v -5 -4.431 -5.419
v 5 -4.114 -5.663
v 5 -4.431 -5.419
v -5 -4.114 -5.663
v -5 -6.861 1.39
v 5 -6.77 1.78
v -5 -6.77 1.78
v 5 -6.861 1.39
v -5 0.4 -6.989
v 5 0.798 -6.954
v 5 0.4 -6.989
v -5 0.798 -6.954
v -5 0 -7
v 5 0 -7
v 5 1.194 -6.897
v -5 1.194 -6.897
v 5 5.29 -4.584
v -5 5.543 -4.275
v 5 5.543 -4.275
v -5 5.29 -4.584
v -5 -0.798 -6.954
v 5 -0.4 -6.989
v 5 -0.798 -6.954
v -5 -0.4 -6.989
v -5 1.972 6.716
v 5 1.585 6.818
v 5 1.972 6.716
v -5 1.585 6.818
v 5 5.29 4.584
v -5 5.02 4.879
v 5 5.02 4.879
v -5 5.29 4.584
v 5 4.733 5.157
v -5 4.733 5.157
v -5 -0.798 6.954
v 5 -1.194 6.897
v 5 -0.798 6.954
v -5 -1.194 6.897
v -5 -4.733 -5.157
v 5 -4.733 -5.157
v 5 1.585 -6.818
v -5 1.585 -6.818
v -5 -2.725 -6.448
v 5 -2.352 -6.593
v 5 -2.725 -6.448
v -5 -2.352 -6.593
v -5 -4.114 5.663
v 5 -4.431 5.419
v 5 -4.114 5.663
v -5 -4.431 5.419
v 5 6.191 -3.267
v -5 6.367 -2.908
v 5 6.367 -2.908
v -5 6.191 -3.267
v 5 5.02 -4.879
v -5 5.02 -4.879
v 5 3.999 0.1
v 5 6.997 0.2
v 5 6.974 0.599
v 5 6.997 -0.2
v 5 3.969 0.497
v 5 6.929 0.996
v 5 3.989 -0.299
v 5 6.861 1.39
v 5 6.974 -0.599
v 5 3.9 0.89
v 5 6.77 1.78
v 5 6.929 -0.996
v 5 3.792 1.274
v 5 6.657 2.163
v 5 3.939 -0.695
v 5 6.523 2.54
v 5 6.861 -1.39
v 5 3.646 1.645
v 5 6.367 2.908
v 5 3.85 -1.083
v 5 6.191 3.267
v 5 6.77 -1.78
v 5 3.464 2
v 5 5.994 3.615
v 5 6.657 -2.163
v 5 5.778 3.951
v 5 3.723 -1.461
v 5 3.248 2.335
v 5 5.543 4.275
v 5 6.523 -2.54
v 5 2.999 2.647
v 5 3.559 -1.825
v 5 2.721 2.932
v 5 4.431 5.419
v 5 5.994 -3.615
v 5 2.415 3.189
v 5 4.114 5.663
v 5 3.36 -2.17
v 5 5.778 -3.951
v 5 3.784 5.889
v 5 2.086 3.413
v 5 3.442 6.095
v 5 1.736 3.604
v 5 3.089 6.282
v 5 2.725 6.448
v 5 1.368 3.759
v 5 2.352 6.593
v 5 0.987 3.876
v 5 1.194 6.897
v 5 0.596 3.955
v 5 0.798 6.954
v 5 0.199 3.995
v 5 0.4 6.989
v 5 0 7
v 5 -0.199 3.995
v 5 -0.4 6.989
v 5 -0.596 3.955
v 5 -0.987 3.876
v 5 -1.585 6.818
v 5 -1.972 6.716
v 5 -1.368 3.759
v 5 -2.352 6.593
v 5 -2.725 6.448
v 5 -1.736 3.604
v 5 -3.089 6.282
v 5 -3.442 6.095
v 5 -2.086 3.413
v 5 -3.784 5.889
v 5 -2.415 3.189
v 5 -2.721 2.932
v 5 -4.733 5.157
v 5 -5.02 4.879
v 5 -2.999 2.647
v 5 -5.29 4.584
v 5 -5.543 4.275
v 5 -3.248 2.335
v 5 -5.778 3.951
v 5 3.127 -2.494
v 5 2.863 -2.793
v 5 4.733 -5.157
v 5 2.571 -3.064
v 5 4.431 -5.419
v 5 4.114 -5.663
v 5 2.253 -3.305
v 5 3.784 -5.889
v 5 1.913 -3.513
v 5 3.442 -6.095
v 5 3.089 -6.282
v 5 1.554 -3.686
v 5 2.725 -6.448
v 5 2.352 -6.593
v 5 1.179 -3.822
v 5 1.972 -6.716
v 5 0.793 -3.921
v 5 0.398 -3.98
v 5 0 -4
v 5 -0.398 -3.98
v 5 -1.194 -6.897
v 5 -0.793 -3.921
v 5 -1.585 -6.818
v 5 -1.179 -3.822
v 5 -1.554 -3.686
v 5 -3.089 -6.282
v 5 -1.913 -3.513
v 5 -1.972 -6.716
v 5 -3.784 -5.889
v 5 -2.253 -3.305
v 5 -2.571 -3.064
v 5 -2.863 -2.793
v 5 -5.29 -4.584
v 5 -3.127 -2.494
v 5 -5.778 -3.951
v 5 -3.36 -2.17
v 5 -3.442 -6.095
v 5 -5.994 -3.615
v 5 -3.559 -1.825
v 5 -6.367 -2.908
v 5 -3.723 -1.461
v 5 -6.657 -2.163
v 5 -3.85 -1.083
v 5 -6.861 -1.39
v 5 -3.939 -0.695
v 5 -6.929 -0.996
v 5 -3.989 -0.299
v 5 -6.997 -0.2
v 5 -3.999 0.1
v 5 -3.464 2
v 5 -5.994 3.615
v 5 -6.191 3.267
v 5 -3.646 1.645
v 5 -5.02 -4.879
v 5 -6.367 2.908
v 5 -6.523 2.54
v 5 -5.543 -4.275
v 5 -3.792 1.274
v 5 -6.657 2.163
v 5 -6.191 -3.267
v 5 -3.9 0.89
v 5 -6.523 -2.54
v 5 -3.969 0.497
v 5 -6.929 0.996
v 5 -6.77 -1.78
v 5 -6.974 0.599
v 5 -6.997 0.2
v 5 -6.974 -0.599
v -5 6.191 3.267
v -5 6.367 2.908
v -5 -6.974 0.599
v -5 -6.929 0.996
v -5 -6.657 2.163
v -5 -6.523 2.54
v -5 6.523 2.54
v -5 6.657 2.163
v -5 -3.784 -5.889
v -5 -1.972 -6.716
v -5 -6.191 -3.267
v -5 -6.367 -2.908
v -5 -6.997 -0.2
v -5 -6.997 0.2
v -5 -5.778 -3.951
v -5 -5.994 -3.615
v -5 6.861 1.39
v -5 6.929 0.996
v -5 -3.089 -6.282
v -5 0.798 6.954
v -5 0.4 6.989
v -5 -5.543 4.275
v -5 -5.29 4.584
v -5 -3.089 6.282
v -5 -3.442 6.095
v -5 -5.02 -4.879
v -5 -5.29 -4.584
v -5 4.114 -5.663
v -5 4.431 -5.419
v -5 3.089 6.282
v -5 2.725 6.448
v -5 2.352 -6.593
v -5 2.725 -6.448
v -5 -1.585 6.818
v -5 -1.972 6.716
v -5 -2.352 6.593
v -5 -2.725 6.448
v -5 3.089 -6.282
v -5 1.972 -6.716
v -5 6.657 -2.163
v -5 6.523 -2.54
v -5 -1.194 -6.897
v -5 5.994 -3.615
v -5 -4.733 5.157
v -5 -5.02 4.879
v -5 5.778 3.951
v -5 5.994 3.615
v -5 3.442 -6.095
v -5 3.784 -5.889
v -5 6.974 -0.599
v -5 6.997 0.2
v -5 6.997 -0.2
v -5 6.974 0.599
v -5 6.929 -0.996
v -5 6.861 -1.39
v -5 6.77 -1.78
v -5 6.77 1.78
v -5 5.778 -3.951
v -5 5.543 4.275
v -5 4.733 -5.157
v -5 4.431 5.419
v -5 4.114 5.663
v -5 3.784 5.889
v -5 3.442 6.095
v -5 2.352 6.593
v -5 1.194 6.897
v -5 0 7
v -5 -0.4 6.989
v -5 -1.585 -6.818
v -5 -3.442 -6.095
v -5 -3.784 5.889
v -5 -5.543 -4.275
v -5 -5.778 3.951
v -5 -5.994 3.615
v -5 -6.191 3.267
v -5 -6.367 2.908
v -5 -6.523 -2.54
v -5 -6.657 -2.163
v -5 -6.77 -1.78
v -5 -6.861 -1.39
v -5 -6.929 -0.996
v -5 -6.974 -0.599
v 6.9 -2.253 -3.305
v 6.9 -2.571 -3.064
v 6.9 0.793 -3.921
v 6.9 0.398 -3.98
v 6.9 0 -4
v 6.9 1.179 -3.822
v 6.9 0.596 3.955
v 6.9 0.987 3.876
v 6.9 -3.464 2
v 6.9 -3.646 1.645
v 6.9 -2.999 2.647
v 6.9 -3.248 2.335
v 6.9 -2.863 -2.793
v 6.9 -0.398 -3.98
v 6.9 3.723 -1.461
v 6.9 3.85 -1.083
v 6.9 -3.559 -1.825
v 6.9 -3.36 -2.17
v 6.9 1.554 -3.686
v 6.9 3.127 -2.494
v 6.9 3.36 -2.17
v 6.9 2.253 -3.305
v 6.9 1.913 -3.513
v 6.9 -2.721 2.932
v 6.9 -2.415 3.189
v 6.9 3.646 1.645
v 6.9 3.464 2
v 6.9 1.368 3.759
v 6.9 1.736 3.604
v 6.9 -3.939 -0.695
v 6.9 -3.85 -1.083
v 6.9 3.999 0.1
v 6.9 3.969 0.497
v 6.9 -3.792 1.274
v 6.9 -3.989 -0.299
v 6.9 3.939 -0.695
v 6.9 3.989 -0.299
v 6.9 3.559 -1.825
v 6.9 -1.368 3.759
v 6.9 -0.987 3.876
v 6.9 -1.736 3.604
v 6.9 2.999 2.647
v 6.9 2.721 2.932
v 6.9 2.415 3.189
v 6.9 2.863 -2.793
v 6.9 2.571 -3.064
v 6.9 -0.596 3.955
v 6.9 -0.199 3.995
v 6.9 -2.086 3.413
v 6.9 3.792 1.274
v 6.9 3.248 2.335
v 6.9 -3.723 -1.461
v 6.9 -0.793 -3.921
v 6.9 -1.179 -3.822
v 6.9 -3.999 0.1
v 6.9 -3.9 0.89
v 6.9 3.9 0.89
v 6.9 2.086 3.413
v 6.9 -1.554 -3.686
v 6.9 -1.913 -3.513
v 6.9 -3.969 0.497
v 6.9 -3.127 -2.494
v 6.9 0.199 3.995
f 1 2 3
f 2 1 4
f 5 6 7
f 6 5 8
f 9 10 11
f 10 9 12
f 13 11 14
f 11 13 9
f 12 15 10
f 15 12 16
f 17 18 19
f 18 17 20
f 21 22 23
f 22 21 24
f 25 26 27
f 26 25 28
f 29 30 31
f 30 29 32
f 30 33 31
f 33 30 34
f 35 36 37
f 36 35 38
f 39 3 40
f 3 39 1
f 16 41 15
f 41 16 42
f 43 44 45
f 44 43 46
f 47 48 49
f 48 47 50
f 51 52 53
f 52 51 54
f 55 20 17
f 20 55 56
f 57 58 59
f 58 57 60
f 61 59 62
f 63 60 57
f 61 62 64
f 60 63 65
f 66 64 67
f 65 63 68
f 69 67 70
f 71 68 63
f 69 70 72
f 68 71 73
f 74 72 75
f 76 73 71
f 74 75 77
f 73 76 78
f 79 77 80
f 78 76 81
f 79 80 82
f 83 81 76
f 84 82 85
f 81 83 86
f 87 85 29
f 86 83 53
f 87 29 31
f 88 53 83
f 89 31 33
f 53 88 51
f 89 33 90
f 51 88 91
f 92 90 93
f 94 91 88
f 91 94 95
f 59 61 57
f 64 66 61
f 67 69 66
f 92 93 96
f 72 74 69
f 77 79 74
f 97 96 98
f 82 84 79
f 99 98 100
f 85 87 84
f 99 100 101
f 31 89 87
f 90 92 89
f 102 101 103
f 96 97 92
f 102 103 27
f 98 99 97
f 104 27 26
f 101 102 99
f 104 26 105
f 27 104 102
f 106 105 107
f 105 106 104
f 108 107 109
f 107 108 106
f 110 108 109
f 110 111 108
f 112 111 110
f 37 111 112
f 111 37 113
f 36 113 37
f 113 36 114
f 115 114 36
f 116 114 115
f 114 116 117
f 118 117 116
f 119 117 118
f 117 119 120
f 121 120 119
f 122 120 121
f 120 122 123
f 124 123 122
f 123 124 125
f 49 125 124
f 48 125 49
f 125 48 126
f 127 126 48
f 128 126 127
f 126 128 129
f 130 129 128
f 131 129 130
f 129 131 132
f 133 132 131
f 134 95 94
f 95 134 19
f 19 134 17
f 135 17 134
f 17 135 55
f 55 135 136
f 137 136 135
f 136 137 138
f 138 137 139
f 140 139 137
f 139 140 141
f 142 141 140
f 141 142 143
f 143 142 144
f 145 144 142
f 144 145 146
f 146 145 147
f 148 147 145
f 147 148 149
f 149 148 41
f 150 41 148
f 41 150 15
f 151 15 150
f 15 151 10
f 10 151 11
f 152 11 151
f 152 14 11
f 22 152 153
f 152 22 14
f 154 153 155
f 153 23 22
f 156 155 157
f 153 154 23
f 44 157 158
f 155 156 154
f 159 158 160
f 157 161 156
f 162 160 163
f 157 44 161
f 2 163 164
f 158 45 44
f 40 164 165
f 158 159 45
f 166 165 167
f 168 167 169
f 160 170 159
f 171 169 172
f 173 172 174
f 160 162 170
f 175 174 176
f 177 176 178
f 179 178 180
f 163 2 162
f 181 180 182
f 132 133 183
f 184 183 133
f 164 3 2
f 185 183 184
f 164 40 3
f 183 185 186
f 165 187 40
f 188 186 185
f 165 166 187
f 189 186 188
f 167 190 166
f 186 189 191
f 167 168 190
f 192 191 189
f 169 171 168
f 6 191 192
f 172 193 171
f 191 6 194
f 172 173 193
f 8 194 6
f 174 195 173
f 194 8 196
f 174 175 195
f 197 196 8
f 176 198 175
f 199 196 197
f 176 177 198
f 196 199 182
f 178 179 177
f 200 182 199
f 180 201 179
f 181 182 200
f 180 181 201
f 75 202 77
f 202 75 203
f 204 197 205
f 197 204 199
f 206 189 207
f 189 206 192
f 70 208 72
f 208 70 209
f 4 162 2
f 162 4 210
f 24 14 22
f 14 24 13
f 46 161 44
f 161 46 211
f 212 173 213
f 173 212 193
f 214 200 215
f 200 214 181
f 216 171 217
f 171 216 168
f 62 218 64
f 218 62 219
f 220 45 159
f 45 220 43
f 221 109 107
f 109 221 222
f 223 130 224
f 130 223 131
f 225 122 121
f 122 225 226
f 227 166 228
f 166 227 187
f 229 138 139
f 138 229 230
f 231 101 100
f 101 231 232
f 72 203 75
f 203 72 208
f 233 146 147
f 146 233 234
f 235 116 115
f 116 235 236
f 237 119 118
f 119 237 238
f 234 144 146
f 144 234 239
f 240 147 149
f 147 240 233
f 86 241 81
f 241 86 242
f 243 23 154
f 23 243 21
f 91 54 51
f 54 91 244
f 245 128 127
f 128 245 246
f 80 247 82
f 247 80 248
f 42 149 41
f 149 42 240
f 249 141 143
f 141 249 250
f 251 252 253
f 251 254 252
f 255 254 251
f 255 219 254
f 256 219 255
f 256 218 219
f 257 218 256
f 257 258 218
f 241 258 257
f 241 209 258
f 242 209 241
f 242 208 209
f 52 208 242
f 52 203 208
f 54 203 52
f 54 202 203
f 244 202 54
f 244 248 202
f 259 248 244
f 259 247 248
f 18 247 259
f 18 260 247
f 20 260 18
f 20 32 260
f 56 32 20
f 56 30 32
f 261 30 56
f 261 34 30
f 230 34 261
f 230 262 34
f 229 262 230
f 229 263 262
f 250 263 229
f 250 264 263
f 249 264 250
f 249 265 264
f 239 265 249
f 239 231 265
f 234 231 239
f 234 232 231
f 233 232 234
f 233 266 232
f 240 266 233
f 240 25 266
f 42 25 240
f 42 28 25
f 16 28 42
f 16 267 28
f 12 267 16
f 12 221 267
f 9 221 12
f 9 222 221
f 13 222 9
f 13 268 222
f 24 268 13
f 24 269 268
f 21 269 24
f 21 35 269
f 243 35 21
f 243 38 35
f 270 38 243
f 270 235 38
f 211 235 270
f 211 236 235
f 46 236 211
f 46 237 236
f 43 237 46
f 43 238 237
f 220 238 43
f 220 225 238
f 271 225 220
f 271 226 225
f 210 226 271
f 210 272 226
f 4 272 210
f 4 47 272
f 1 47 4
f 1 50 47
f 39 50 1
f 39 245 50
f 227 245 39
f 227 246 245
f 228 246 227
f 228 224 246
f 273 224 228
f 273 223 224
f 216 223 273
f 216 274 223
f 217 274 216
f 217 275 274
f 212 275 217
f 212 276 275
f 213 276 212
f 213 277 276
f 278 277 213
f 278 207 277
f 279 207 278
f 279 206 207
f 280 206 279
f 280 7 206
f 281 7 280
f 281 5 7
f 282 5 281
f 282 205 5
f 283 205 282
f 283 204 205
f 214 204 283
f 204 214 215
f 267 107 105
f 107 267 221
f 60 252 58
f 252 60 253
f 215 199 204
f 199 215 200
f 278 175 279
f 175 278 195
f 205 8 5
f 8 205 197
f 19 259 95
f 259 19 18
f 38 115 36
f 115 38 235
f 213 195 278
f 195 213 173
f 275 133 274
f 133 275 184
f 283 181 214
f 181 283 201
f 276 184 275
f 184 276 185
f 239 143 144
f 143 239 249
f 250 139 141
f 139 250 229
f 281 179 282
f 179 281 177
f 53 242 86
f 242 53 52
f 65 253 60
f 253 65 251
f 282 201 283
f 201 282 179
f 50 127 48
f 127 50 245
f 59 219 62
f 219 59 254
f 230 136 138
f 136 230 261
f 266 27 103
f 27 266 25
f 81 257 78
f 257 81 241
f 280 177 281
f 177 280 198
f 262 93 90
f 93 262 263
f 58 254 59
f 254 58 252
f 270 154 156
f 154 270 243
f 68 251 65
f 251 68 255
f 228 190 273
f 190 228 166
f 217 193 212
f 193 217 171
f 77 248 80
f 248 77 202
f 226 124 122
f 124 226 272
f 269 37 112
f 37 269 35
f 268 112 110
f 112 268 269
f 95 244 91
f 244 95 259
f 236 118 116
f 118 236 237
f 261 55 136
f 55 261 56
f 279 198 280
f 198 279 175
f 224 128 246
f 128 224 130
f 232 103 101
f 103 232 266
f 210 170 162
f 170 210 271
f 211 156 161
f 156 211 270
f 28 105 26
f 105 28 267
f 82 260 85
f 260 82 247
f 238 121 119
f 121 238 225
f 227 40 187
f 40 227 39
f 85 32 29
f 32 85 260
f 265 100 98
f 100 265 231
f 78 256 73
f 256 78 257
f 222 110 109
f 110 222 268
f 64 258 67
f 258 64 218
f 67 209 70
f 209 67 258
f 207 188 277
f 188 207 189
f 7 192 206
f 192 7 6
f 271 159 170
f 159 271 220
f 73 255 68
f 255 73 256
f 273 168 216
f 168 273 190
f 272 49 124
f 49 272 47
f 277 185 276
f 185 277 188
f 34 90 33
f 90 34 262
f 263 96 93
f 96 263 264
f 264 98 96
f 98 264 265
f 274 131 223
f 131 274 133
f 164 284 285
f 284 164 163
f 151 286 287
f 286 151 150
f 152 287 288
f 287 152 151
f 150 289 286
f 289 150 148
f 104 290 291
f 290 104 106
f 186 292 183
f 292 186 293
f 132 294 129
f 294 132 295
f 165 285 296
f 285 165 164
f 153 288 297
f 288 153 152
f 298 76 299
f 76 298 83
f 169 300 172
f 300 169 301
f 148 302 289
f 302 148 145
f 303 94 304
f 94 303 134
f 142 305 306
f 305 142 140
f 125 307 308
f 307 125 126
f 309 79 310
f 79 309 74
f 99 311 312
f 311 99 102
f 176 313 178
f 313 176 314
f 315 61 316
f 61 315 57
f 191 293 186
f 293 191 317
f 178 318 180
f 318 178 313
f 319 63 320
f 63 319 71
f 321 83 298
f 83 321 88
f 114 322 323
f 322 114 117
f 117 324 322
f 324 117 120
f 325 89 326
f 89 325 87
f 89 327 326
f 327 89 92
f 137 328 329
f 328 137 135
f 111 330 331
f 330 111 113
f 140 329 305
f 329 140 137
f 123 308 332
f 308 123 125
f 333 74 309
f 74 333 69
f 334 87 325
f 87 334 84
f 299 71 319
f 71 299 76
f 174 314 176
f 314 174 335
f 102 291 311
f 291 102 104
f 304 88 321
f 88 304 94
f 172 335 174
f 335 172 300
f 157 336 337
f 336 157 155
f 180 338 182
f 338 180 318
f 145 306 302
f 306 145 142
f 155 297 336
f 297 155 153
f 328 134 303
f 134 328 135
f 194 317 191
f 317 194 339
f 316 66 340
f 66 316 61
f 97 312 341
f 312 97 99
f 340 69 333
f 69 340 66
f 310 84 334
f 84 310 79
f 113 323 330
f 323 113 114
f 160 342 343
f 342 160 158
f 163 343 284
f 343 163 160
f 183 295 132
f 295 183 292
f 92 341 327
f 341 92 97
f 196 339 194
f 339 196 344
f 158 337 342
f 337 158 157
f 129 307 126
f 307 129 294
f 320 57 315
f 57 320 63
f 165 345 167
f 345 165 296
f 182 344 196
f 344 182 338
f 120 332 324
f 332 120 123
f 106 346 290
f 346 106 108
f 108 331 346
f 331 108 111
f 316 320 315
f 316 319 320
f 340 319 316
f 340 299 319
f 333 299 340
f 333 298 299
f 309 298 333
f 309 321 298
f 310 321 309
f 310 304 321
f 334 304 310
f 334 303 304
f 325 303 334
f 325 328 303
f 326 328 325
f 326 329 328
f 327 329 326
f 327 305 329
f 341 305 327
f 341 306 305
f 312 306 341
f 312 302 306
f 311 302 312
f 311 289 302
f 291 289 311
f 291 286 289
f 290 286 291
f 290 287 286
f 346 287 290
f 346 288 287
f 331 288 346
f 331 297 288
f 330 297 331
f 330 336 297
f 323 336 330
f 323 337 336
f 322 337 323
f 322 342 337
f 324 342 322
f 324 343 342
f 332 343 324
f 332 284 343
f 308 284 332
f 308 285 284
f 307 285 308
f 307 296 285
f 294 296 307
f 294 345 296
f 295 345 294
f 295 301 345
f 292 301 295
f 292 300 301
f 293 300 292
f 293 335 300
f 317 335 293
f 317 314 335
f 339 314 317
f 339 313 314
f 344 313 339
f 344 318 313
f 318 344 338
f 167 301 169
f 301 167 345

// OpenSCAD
$fa = 2;
$fs = 0.4;

module gimbal_roll_motor() {
  color("#3a3a42")
    rotate([0, 90, 0])
      union() {
        cylinder(h = 10, d = 14, center = true);
        // Output hub joins the can (it floated 1 mm off it).
        translate([0, 0, 4.9])
          cylinder(h = 2, d = 8);
      }
}

gimbal_roll_motor();
